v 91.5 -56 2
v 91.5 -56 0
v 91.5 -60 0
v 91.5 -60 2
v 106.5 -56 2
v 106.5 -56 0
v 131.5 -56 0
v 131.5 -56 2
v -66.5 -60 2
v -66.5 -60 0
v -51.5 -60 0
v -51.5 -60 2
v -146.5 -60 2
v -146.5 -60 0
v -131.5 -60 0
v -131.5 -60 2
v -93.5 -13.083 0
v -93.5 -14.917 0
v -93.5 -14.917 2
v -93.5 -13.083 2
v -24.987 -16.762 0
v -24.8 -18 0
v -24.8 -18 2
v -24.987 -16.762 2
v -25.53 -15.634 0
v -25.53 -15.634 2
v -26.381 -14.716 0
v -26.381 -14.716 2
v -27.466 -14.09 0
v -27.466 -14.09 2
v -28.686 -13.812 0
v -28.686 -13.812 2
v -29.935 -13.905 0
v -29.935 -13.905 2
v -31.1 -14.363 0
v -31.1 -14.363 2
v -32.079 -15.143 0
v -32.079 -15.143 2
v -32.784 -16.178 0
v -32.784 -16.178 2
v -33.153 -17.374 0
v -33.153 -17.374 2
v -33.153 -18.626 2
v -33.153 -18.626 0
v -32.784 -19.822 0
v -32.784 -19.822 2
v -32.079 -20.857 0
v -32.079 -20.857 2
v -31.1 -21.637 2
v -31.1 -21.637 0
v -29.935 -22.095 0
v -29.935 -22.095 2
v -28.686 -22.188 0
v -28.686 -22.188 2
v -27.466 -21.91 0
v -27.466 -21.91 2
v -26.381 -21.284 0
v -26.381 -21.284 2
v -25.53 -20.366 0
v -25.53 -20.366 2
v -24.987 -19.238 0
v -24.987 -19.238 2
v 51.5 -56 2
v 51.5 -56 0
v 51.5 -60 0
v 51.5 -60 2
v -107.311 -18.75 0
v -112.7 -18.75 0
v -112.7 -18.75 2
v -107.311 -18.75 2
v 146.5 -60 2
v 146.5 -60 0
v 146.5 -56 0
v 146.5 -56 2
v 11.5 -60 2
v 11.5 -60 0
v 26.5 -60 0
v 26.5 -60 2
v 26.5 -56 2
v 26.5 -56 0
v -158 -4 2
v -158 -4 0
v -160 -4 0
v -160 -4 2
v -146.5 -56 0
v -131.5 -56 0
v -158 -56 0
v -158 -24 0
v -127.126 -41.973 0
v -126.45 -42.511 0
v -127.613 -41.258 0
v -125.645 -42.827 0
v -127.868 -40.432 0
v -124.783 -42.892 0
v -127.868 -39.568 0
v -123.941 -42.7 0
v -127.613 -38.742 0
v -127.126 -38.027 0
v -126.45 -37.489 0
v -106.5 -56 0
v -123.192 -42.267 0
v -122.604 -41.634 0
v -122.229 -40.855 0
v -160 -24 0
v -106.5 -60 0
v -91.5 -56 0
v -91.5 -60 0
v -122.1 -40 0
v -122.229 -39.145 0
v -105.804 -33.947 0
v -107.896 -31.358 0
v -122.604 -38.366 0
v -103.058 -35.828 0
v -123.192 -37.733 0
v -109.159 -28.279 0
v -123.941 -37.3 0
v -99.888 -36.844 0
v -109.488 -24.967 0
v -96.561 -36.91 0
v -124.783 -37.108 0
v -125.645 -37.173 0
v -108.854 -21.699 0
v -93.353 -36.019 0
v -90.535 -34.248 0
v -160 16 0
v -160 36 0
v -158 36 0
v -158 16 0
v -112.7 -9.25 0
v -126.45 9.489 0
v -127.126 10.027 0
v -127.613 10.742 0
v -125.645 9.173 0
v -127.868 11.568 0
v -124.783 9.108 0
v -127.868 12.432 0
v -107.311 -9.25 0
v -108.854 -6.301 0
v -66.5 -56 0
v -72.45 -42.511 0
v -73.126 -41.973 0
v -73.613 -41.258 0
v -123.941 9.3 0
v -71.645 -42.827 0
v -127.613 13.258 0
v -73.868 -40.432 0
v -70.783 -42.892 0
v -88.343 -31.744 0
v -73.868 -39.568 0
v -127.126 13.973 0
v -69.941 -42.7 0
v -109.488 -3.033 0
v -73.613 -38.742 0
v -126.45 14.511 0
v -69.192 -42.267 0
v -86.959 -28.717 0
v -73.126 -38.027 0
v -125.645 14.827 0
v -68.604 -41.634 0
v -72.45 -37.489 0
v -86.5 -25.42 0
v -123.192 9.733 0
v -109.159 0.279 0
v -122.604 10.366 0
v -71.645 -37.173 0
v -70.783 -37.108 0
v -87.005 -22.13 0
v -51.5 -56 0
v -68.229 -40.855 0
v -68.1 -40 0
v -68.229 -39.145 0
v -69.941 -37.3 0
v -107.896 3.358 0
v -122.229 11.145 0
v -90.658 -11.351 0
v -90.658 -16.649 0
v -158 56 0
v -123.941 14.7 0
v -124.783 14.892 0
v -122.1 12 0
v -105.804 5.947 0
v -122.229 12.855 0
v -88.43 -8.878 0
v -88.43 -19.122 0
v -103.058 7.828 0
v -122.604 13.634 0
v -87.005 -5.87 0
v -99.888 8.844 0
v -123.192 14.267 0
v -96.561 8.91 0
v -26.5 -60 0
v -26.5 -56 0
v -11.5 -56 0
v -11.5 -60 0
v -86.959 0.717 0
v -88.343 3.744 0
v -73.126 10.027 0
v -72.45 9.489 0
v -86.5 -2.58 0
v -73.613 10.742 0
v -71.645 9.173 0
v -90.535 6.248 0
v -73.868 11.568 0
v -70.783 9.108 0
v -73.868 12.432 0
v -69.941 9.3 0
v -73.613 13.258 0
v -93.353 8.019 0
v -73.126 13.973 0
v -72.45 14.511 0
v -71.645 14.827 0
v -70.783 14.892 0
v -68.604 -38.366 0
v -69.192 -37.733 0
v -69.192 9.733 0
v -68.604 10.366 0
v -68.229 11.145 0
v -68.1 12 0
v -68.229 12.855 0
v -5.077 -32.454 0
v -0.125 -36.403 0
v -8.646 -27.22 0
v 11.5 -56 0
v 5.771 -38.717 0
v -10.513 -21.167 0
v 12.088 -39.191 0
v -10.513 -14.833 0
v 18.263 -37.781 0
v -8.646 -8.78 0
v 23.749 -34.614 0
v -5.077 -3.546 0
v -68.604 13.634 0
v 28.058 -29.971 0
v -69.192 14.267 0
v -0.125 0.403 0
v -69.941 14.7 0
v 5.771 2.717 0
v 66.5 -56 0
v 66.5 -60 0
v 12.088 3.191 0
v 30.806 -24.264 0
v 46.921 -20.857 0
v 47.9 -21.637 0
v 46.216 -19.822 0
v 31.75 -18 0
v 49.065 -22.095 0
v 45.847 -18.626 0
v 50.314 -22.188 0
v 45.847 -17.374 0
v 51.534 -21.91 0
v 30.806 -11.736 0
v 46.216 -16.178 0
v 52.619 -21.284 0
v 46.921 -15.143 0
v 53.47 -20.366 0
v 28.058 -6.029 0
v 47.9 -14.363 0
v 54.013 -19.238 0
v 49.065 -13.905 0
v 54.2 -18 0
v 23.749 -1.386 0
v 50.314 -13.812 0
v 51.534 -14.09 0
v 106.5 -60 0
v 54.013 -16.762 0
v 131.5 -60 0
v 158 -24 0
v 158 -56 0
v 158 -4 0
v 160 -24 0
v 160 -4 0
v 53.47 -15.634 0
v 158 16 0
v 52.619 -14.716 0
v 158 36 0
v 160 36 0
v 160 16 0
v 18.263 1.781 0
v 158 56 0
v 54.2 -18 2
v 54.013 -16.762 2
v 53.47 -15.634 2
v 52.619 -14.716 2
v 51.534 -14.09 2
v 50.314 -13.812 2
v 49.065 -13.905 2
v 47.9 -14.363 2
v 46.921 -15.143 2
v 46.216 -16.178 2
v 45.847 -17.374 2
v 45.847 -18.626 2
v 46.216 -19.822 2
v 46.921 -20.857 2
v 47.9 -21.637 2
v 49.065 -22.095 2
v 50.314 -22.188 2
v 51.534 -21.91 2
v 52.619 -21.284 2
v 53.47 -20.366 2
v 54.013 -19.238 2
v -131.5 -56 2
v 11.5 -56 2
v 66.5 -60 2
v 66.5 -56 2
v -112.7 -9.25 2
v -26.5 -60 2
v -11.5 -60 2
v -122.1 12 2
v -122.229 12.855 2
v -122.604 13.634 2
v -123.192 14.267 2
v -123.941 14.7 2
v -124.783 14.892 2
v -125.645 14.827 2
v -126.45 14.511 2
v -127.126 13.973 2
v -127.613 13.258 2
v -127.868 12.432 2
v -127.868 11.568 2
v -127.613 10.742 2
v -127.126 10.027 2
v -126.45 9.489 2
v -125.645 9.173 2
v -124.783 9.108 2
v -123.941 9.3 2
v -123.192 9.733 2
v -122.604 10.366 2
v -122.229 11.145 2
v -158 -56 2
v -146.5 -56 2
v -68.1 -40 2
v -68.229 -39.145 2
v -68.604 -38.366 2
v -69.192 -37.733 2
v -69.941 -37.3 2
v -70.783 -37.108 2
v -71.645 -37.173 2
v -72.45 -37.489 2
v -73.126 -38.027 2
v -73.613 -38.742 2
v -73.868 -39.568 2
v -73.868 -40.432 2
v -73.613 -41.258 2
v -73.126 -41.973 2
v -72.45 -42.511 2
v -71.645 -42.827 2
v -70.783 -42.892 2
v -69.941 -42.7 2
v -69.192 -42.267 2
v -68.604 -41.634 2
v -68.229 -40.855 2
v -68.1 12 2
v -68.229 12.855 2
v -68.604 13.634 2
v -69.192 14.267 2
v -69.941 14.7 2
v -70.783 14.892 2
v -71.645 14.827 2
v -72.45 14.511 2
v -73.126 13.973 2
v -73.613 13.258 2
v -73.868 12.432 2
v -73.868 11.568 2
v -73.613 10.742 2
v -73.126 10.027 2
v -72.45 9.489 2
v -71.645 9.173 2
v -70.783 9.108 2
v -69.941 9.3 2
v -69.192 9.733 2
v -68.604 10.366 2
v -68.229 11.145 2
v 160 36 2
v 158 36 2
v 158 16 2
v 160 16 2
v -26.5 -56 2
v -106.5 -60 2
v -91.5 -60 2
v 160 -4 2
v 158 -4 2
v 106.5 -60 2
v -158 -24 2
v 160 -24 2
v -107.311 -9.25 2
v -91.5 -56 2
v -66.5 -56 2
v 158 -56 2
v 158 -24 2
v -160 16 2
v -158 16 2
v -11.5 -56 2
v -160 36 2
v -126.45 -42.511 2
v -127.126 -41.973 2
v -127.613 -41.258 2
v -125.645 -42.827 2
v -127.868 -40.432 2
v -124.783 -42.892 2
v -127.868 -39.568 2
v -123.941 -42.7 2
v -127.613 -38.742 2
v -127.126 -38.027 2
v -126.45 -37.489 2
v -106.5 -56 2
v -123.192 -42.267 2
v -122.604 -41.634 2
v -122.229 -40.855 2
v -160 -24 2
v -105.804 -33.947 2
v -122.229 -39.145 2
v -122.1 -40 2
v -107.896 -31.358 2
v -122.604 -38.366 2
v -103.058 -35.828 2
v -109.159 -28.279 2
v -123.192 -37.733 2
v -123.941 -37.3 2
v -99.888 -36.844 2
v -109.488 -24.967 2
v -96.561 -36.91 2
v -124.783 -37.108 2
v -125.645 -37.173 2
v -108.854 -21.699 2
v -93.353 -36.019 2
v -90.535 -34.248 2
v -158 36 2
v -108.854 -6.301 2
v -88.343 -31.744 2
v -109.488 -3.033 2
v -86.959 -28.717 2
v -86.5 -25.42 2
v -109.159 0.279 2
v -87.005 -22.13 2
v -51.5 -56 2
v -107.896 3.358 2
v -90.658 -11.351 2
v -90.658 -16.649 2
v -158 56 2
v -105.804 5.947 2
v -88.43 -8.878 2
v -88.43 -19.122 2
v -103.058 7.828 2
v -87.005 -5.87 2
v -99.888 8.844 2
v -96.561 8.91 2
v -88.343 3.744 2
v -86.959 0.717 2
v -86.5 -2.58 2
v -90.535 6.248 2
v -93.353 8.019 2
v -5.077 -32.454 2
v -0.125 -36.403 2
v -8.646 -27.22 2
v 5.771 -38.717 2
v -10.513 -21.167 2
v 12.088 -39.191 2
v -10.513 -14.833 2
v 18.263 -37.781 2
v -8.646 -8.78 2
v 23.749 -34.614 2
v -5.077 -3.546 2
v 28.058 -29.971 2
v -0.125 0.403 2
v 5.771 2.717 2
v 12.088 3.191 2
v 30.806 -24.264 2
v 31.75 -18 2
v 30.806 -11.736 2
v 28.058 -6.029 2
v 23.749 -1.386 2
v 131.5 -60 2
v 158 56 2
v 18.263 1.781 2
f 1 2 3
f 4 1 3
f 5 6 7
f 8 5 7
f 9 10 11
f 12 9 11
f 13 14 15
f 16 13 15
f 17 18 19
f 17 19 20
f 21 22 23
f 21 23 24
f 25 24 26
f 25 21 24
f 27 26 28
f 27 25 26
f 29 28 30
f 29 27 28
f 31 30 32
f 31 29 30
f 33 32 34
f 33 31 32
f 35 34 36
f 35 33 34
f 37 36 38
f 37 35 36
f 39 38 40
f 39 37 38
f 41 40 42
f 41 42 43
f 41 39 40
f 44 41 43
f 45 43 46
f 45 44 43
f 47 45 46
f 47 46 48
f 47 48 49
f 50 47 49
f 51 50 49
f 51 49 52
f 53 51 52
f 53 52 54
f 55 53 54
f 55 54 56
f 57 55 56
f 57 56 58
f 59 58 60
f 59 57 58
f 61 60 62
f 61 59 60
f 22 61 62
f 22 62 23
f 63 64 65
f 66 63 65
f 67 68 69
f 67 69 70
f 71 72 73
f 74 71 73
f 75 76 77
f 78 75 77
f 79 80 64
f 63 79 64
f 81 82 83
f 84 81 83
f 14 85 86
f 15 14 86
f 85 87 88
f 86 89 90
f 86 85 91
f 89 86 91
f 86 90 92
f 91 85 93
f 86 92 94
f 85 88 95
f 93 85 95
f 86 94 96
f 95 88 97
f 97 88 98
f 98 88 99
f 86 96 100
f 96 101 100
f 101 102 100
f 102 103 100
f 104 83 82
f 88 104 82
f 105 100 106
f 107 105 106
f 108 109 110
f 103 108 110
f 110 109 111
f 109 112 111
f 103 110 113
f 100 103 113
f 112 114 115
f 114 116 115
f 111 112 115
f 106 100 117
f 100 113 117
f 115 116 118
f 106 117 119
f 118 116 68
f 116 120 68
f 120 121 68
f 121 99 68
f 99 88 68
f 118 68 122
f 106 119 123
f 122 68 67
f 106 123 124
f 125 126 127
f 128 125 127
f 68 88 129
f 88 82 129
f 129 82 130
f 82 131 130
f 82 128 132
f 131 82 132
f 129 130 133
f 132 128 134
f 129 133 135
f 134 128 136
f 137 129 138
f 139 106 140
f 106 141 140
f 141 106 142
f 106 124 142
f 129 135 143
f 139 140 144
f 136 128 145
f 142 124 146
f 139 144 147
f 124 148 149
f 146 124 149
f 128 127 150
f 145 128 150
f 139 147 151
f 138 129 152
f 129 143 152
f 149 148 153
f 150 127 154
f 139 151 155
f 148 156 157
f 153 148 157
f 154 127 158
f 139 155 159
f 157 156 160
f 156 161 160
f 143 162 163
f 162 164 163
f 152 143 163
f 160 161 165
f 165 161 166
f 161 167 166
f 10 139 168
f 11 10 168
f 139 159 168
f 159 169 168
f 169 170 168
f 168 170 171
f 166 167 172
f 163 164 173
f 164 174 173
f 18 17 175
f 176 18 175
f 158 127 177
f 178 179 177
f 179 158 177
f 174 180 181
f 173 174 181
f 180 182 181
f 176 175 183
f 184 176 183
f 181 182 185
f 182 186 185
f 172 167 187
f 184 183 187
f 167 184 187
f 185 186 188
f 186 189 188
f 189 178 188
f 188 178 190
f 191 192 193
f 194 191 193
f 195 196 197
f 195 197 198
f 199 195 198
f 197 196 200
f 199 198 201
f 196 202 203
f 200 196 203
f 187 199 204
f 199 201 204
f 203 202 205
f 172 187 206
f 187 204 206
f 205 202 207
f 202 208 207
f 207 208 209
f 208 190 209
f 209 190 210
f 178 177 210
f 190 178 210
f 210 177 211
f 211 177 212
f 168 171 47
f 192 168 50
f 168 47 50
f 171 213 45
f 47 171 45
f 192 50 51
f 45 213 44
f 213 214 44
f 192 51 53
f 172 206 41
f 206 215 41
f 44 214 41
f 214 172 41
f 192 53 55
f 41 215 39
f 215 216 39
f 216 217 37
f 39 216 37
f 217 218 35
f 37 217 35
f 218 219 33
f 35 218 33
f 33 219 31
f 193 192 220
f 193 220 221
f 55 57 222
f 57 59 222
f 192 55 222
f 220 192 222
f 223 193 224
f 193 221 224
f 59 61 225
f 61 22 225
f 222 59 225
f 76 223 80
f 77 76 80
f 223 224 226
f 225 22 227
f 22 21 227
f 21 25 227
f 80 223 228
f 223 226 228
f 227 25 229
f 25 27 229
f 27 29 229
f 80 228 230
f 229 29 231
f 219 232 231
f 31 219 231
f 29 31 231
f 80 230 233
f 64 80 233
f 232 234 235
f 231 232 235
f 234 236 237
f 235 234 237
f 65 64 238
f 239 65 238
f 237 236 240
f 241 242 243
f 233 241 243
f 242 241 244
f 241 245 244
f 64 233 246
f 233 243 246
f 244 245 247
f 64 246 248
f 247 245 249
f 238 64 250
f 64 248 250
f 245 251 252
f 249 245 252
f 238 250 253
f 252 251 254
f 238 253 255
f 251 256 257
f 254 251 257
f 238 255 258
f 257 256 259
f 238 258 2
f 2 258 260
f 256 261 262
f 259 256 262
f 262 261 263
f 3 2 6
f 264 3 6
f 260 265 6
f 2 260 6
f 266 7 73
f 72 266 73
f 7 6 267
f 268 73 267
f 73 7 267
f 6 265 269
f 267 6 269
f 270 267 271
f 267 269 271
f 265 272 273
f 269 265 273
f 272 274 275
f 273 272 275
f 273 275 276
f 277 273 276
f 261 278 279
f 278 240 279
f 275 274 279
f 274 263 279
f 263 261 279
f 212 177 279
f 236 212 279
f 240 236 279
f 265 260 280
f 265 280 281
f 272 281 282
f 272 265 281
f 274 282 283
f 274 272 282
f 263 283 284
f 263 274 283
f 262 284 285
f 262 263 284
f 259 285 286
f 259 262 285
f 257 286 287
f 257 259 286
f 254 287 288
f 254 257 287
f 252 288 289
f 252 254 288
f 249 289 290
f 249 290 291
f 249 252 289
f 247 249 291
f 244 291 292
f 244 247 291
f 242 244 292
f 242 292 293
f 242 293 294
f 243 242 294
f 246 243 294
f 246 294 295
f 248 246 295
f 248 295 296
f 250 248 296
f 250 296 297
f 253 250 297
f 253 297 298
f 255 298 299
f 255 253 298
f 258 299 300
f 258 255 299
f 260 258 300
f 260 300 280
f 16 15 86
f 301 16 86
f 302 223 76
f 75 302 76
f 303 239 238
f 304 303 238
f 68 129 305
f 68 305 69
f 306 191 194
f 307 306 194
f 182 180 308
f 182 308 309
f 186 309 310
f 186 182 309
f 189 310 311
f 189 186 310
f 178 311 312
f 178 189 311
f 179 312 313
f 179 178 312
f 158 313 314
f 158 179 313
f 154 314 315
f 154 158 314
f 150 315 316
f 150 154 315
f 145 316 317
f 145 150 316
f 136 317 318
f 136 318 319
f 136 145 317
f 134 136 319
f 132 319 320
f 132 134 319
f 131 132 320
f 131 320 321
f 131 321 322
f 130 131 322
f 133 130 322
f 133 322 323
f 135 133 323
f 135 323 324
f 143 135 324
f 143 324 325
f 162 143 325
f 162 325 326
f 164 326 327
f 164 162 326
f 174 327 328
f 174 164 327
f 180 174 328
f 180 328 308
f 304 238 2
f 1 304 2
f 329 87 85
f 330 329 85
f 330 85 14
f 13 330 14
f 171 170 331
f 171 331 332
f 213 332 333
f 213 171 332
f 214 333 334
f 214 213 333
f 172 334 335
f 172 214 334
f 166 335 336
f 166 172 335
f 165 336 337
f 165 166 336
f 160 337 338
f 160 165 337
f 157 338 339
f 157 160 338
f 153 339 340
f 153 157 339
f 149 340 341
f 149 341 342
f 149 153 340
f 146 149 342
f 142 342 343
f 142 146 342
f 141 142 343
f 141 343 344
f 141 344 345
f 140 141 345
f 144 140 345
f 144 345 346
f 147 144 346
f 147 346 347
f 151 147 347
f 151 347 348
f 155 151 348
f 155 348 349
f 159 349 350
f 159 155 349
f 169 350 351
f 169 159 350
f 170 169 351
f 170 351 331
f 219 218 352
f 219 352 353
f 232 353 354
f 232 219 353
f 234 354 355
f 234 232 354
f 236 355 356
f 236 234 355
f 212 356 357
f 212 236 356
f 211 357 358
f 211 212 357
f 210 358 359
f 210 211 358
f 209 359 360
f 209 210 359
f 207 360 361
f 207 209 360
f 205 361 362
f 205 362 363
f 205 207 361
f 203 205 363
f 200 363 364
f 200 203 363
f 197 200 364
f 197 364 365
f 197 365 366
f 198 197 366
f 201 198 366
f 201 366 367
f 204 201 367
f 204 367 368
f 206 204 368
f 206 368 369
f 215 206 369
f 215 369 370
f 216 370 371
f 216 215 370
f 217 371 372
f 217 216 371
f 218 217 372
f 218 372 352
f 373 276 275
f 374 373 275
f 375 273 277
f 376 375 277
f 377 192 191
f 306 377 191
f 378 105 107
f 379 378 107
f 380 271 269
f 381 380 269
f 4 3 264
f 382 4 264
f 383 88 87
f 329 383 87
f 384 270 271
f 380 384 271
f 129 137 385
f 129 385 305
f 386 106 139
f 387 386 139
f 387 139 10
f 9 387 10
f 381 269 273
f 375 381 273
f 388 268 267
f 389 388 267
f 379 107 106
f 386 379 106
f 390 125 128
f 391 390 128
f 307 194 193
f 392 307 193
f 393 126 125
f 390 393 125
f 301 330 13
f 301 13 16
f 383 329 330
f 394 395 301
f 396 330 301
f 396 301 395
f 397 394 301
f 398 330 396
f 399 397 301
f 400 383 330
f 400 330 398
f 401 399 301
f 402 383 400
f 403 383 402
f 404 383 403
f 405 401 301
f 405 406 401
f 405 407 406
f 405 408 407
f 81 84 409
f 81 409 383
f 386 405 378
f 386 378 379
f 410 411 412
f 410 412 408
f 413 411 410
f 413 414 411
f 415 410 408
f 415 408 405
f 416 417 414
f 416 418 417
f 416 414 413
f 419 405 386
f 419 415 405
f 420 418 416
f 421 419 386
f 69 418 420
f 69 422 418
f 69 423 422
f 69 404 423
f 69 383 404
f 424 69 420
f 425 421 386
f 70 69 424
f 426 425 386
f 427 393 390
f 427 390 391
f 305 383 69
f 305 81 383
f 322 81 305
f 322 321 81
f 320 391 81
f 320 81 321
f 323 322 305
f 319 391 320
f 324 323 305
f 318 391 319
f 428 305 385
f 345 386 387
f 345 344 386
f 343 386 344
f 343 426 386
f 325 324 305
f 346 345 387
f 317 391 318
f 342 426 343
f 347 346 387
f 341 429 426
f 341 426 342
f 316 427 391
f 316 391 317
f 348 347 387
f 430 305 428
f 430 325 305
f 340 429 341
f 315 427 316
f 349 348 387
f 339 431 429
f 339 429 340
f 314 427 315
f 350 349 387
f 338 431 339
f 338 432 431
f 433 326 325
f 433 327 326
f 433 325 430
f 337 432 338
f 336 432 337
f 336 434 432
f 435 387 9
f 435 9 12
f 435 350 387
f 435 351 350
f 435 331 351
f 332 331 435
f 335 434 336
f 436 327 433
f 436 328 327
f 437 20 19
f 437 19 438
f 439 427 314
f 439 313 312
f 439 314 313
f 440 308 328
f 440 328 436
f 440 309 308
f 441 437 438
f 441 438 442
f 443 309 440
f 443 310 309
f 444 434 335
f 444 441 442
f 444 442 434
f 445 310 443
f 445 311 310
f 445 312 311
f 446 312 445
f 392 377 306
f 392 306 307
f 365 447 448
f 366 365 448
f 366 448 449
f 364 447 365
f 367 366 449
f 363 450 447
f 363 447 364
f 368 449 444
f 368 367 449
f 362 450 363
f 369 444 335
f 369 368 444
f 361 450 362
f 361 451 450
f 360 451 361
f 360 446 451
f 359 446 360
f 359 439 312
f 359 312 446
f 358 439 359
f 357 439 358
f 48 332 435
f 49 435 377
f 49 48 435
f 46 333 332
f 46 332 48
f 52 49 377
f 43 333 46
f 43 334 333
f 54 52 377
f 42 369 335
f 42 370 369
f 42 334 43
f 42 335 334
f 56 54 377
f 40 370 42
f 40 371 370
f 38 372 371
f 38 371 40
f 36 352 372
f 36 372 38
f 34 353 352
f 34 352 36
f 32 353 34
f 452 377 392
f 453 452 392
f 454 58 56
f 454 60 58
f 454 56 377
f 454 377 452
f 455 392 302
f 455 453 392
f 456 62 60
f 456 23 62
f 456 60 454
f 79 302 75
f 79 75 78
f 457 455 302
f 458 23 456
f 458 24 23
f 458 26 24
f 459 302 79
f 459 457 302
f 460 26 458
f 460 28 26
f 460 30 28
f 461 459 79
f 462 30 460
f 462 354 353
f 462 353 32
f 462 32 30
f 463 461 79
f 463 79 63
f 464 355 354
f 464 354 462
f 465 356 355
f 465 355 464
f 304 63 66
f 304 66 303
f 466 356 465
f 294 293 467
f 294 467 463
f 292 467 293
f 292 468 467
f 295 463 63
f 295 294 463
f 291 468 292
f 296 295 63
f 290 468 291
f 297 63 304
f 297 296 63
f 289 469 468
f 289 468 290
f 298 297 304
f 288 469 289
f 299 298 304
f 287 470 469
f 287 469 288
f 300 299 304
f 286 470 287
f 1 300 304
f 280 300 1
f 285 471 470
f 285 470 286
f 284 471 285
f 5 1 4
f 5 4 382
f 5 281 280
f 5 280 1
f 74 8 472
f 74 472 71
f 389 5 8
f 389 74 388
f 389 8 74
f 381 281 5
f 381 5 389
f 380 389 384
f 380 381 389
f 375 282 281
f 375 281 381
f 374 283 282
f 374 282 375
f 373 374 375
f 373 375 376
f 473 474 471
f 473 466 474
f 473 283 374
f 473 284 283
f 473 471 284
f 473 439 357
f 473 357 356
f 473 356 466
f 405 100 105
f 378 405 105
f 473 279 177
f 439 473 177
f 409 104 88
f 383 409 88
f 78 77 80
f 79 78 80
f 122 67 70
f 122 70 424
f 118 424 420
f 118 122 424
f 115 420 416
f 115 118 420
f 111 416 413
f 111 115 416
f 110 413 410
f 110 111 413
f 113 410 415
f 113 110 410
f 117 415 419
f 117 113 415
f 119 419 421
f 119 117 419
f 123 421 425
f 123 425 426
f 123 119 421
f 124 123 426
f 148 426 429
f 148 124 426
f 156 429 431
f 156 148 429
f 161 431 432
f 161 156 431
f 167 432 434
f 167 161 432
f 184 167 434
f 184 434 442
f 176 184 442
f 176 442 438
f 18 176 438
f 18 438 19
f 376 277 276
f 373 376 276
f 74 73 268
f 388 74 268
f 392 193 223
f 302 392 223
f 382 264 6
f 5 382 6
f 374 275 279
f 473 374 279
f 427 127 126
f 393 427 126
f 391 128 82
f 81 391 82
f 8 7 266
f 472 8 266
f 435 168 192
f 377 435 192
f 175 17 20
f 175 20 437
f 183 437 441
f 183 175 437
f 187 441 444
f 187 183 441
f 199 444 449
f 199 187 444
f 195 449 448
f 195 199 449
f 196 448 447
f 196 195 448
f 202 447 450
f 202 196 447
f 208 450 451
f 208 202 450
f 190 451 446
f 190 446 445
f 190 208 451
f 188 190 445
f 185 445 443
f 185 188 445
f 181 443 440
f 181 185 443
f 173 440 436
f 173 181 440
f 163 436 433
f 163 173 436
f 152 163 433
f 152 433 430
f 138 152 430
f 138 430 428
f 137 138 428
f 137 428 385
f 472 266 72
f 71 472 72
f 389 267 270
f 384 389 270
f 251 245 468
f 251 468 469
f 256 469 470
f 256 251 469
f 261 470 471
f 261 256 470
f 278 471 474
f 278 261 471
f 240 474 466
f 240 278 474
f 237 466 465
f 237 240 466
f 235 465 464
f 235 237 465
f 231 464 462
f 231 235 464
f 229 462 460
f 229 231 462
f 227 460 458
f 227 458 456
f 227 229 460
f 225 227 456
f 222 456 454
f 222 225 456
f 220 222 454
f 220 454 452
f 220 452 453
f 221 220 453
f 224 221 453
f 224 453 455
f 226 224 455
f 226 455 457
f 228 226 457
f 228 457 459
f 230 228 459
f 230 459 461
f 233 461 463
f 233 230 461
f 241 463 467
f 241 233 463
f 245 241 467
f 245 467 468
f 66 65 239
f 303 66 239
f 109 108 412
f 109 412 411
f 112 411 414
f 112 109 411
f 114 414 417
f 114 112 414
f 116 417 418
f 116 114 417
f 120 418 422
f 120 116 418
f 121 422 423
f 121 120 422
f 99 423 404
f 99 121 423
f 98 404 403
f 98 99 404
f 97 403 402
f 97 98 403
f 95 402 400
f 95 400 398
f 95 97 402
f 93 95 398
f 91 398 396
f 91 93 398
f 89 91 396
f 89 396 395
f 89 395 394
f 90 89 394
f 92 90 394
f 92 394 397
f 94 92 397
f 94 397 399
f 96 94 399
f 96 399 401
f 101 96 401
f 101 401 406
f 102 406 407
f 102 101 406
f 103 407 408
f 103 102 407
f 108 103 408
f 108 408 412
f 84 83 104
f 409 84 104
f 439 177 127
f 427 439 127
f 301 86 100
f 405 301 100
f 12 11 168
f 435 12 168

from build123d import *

# Parameters (mm, degrees)
SKETCH1_R               = 21.25
SKETCH1_R_2             = 4.2
SKETCH1_R_3             = 2.9
BOSS_EXTRUDE1_DEPTH     = 2
CUT_EXTRUDE1_DEPTH      = 171.89177862
CUT_EXTRUDE1_DEPTH_BACK = 171.89177862
SKETCH2_W               = 15
SKETCH2_H               = 2


with BuildPart() as part:
    # Sketch1 → Boss-Extrude1 (new body)
    with BuildSketch(Plane.XY):
        Polygon((-158, -56), (-146.5, -56), (-146.5, -60), (-131.5, -60), (-131.5, -56), (-106.5, -56), (-106.5, -60), (-91.5, -60), (-91.5, -56), (-66.5, -56), (-66.5, -60), (-51.5, -60), (-51.5, -56), (-26.5, -56), (-26.5, -60), (-11.5, -60), (-11.5, -56), (11.5, -56), (11.5, -60), (26.5, -60), (26.5, -56), (51.5, -56), (51.5, -60), (66.5, -60), (66.5, -56), (91.5, -56), (91.5, -60), (106.5, -60), (106.5, -56), (131.5, -56), (131.5, -60), (146.5, -60), (146.5, -56), (158, -56), (158, -24), (160, -24), (160, -4), (158, -4), (158, 16), (160, 16), (160, 36), (158, 36), (158, 56), (146.5, 56), (146.5, 58), (131.5, 58), (131.5, 56), (106.5, 56), (106.5, 58), (91.5, 58), (91.5, 56), (66.5, 56), (66.5, 58), (51.5, 58), (51.5, 56), (26.5, 56), (26.5, 58), (11.5, 58), (11.5, 56), (-11.5, 56), (-11.5, 58), (-26.5, 58), (-26.5, 56), (-51.5, 56), (-51.5, 58), (-66.5, 58), (-66.5, 56), (-91.5, 56), (-91.5, 58), (-106.5, 58), (-106.5, 56), (-131.5, 56), (-131.5, 58), (-146.5, 58), (-146.5, 56), (-158, 56), (-158, 36), (-160, 36), (-160, 16), (-158, 16), (-158, -4), (-160, -4), (-160, -24), (-158, -24), align=None)
        with Locations((10.5, -18)):
            Circle(SKETCH1_R, mode=Mode.SUBTRACT)
        with Locations((-29, -18)):
            Circle(SKETCH1_R_2, mode=Mode.SUBTRACT)
        with Locations((50, -18)):
            Circle(SKETCH1_R_2, mode=Mode.SUBTRACT)
        with Locations((-125, -40)):
            Circle(SKETCH1_R_3, mode=Mode.SUBTRACT)
        with Locations((-71, -40)):
            Circle(SKETCH1_R_3, mode=Mode.SUBTRACT)
        with Locations((-125, 12)):
            Circle(SKETCH1_R_3, mode=Mode.SUBTRACT)
        with Locations((-71, 12)):
            Circle(SKETCH1_R_3, mode=Mode.SUBTRACT)
        with BuildLine():
            Line((-93.5, -14.916994756), (-93.5, -13.083005244))
            ThreePointArc((-93.5, -13.083005244), (-94.924535841, 8.581133525), (-107.310612225, -9.25))
            Line((-107.310612225, -9.25), (-112.7, -9.25))
            Line((-112.7, -9.25), (-112.7, -18.75))
            Line((-112.7, -18.75), (-107.310612225, -18.75))
            ThreePointArc((-107.310612225, -18.75), (-94.924535841, -36.581133525), (-93.5, -14.916994756))
        make_face(mode=Mode.SUBTRACT)
    extrude(amount=BOSS_EXTRUDE1_DEPTH)

    # Sketch2 → Cut-Extrude1 (cut, two sides: drawn at the far end of the back side and taken through both)
    with BuildSketch(Plane.XY.offset(2).offset(-CUT_EXTRUDE1_DEPTH_BACK)):
        with Locations((-139, 57)):
            Rectangle(SKETCH2_W, SKETCH2_H)
        with Locations((-99, 57)):
            Rectangle(SKETCH2_W, SKETCH2_H)
        with Locations((-59, 57)):
            Rectangle(SKETCH2_W, SKETCH2_H)
        with Locations((-19, 57)):
            Rectangle(SKETCH2_W, SKETCH2_H)
        with Locations((19, 57)):
            Rectangle(SKETCH2_W, SKETCH2_H)
        with Locations((59, 57)):
            Rectangle(SKETCH2_W, SKETCH2_H)
        with Locations((99, 57)):
            Rectangle(SKETCH2_W, SKETCH2_H)
        with Locations((139, 57)):
            Rectangle(SKETCH2_W, SKETCH2_H)
    extrude(amount=CUT_EXTRUDE1_DEPTH + CUT_EXTRUDE1_DEPTH_BACK, mode=Mode.SUBTRACT)


solid = part.part
